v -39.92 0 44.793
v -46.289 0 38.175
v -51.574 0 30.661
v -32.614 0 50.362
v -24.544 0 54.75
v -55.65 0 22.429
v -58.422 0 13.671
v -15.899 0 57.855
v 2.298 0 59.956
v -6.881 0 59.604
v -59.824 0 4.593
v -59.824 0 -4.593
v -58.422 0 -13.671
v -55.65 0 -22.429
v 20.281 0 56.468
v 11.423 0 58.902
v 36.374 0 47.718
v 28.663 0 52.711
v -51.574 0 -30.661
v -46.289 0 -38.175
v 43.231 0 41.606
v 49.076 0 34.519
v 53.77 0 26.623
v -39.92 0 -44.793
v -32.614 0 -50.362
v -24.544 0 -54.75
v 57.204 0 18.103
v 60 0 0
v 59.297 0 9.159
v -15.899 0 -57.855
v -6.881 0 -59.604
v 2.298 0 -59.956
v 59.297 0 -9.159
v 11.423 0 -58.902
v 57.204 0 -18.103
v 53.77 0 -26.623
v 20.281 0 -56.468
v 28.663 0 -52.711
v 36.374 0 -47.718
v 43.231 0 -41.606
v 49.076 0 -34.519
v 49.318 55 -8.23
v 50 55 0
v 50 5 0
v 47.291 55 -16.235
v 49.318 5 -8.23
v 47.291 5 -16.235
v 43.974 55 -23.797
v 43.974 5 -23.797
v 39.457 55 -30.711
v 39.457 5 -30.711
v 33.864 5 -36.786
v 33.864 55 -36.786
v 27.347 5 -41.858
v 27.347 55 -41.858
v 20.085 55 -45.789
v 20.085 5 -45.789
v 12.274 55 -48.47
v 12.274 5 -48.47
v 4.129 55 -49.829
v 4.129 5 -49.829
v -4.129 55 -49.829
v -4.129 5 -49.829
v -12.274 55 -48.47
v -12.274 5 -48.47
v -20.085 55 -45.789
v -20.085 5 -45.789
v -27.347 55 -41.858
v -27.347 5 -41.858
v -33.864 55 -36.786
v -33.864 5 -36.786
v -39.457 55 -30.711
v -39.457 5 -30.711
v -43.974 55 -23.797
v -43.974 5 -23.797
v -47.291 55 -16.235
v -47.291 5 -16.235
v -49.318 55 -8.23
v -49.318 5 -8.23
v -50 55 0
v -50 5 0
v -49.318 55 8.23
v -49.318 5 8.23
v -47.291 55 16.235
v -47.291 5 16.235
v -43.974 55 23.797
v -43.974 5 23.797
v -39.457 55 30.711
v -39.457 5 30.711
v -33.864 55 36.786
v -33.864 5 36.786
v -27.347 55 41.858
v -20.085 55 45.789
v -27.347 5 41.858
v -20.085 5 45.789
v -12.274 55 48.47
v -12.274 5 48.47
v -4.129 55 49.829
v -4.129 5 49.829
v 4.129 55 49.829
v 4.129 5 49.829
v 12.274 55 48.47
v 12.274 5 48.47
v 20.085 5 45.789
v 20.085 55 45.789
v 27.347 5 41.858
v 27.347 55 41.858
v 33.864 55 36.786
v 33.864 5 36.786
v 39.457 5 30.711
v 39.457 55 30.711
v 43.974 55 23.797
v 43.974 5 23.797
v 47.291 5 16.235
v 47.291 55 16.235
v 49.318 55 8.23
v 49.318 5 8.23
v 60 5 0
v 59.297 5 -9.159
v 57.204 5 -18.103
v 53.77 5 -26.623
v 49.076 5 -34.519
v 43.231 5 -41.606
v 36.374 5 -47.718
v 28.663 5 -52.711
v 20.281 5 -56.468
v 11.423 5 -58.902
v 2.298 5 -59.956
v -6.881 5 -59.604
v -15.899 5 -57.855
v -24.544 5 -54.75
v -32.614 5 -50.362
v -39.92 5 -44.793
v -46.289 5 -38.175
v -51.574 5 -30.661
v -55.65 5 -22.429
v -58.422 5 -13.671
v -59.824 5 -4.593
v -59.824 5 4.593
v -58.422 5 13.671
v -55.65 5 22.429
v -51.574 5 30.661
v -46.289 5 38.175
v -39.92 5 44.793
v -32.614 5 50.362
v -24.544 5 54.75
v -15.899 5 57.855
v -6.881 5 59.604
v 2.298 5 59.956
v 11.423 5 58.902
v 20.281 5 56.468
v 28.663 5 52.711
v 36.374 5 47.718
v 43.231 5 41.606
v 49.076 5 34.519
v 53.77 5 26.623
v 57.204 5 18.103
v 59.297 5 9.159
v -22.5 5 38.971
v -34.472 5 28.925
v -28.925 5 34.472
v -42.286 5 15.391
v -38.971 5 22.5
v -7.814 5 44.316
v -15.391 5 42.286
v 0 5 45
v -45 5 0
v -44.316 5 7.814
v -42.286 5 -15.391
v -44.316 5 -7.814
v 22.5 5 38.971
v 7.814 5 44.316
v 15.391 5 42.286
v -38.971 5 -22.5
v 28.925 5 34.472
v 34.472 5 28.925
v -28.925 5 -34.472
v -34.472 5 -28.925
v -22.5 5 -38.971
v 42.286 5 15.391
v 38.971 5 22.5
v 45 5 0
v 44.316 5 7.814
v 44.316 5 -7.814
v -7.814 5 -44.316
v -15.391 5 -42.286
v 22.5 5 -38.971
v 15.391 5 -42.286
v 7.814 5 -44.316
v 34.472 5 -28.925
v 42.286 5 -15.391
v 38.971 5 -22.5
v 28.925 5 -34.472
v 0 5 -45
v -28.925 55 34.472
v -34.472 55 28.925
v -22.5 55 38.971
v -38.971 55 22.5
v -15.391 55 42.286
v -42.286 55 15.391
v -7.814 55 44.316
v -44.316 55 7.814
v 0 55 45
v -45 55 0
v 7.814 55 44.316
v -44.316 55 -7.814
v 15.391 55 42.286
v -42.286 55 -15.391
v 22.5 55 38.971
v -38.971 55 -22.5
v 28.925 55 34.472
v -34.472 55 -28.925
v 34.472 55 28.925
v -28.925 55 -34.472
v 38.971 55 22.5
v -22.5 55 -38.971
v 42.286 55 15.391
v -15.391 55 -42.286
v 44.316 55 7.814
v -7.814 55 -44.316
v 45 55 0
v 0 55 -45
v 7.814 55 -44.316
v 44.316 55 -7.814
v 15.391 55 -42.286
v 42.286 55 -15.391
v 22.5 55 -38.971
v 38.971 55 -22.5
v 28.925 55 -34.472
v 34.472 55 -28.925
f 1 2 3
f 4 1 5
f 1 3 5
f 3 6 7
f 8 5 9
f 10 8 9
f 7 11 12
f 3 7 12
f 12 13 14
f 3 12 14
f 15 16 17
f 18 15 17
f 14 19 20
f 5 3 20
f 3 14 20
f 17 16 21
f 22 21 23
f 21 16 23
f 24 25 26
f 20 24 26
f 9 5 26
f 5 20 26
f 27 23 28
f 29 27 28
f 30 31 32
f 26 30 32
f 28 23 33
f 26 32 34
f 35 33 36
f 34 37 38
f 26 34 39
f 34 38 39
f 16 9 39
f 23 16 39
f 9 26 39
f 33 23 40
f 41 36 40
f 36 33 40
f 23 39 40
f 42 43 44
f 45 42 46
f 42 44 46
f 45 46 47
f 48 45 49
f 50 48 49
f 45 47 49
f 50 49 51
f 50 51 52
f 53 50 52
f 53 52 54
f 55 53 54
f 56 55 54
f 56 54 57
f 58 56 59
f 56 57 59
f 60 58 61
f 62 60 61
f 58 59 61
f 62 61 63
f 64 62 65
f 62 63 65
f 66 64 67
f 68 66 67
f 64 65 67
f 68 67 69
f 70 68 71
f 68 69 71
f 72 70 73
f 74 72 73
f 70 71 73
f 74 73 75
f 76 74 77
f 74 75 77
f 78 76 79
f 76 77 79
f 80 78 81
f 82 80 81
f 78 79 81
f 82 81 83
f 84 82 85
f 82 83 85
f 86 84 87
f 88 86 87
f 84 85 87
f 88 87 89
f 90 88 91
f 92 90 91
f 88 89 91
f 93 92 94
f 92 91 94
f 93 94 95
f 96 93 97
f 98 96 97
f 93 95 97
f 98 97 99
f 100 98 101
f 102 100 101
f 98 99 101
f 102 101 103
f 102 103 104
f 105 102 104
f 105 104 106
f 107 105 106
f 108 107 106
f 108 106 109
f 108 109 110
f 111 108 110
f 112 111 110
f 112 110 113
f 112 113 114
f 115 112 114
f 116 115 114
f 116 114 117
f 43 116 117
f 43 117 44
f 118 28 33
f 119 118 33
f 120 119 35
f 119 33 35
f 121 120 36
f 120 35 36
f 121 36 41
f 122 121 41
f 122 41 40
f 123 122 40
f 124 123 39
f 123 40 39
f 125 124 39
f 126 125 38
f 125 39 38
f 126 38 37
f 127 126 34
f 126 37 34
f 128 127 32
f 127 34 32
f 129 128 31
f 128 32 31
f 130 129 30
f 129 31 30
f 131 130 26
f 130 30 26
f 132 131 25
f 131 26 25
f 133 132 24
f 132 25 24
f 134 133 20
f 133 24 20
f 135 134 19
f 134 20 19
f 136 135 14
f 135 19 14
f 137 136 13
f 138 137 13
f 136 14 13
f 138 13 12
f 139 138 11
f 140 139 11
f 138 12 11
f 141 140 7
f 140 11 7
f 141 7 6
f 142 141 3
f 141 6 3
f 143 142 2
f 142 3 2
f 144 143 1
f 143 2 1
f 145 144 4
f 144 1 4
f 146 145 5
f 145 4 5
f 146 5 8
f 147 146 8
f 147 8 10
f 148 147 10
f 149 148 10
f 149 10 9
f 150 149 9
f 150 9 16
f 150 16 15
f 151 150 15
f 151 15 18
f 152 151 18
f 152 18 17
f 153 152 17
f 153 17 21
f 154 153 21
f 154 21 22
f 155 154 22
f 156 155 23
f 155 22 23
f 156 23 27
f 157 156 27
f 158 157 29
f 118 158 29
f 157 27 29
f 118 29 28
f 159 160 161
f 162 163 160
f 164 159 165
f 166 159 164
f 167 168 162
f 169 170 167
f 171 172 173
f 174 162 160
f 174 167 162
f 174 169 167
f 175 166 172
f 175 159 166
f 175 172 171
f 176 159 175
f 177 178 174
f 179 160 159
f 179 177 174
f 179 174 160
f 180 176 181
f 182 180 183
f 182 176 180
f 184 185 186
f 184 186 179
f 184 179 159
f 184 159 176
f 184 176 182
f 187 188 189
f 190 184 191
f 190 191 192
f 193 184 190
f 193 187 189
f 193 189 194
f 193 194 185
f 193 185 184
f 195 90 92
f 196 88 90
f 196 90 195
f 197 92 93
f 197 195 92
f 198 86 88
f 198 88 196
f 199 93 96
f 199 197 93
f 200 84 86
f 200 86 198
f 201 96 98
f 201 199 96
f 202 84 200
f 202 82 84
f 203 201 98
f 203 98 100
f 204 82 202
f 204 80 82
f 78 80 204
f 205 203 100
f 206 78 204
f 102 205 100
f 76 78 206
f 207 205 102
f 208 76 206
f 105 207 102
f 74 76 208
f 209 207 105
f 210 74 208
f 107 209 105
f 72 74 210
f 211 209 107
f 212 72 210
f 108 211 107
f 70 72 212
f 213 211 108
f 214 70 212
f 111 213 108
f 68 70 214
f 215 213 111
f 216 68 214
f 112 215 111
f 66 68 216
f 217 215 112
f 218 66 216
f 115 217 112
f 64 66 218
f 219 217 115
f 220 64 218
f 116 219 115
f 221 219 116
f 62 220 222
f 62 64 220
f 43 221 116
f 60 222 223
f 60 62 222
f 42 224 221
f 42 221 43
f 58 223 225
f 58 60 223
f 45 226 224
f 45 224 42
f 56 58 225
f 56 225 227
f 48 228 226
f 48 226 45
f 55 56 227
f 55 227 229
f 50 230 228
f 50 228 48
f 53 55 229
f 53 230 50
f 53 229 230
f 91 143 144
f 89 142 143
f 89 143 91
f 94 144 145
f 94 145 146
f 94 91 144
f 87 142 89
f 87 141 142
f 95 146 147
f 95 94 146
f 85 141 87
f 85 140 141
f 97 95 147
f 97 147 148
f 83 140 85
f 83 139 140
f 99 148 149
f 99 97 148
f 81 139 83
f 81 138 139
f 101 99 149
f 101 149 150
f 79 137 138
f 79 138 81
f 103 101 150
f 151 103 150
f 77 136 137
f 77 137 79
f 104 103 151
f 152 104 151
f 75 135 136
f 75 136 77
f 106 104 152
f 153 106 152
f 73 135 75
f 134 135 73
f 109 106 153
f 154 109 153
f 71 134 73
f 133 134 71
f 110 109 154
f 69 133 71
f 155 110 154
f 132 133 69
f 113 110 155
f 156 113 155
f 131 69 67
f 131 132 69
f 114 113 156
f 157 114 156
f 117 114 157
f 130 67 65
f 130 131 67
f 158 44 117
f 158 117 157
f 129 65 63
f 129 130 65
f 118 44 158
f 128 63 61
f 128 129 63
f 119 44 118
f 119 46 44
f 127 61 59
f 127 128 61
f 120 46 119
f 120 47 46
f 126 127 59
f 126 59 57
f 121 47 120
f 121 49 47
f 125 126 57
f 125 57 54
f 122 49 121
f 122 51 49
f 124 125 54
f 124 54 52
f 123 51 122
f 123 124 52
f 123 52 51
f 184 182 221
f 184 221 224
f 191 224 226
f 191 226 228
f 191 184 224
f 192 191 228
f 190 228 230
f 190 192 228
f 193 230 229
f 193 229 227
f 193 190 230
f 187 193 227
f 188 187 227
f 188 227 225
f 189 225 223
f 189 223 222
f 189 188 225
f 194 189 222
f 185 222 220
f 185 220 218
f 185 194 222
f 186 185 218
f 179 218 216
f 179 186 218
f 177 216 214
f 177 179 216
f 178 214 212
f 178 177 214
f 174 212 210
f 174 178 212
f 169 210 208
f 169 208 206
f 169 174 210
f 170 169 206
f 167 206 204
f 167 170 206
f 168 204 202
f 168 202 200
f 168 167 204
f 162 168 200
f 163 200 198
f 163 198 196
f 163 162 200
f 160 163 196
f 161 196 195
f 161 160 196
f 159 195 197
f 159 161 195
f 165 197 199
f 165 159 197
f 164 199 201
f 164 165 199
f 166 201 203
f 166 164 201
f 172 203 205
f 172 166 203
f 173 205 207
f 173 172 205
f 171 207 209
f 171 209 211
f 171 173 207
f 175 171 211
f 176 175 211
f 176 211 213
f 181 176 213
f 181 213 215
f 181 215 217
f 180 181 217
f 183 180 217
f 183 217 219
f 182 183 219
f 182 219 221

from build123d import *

# Parameters (mm, degrees)
SKETCH1_R           = 60
BOSS_EXTRUDE1_DEPTH = 5
SKETCH2_R           = 50
SKETCH2_R_2         = 45
BOSS_EXTRUDE2_DEPTH = 50


with BuildPart() as part:
    # Sketch1 → Boss-Extrude1 (new body)
    with BuildSketch(Plane(origin=(0, 0, 0), x_dir=(1, 0, 0), z_dir=(0, 1, 0))):
        Circle(SKETCH1_R)
    extrude(amount=BOSS_EXTRUDE1_DEPTH)

    # Sketch2 → Boss-Extrude2 (add)
    with BuildSketch(Plane(origin=(0, 5, 0), x_dir=(1, 0, 0), z_dir=(0, 1, 0))):
        Circle(SKETCH2_R)
        Circle(SKETCH2_R_2, mode=Mode.SUBTRACT)
    extrude(amount=BOSS_EXTRUDE2_DEPTH)


solid = part.part
